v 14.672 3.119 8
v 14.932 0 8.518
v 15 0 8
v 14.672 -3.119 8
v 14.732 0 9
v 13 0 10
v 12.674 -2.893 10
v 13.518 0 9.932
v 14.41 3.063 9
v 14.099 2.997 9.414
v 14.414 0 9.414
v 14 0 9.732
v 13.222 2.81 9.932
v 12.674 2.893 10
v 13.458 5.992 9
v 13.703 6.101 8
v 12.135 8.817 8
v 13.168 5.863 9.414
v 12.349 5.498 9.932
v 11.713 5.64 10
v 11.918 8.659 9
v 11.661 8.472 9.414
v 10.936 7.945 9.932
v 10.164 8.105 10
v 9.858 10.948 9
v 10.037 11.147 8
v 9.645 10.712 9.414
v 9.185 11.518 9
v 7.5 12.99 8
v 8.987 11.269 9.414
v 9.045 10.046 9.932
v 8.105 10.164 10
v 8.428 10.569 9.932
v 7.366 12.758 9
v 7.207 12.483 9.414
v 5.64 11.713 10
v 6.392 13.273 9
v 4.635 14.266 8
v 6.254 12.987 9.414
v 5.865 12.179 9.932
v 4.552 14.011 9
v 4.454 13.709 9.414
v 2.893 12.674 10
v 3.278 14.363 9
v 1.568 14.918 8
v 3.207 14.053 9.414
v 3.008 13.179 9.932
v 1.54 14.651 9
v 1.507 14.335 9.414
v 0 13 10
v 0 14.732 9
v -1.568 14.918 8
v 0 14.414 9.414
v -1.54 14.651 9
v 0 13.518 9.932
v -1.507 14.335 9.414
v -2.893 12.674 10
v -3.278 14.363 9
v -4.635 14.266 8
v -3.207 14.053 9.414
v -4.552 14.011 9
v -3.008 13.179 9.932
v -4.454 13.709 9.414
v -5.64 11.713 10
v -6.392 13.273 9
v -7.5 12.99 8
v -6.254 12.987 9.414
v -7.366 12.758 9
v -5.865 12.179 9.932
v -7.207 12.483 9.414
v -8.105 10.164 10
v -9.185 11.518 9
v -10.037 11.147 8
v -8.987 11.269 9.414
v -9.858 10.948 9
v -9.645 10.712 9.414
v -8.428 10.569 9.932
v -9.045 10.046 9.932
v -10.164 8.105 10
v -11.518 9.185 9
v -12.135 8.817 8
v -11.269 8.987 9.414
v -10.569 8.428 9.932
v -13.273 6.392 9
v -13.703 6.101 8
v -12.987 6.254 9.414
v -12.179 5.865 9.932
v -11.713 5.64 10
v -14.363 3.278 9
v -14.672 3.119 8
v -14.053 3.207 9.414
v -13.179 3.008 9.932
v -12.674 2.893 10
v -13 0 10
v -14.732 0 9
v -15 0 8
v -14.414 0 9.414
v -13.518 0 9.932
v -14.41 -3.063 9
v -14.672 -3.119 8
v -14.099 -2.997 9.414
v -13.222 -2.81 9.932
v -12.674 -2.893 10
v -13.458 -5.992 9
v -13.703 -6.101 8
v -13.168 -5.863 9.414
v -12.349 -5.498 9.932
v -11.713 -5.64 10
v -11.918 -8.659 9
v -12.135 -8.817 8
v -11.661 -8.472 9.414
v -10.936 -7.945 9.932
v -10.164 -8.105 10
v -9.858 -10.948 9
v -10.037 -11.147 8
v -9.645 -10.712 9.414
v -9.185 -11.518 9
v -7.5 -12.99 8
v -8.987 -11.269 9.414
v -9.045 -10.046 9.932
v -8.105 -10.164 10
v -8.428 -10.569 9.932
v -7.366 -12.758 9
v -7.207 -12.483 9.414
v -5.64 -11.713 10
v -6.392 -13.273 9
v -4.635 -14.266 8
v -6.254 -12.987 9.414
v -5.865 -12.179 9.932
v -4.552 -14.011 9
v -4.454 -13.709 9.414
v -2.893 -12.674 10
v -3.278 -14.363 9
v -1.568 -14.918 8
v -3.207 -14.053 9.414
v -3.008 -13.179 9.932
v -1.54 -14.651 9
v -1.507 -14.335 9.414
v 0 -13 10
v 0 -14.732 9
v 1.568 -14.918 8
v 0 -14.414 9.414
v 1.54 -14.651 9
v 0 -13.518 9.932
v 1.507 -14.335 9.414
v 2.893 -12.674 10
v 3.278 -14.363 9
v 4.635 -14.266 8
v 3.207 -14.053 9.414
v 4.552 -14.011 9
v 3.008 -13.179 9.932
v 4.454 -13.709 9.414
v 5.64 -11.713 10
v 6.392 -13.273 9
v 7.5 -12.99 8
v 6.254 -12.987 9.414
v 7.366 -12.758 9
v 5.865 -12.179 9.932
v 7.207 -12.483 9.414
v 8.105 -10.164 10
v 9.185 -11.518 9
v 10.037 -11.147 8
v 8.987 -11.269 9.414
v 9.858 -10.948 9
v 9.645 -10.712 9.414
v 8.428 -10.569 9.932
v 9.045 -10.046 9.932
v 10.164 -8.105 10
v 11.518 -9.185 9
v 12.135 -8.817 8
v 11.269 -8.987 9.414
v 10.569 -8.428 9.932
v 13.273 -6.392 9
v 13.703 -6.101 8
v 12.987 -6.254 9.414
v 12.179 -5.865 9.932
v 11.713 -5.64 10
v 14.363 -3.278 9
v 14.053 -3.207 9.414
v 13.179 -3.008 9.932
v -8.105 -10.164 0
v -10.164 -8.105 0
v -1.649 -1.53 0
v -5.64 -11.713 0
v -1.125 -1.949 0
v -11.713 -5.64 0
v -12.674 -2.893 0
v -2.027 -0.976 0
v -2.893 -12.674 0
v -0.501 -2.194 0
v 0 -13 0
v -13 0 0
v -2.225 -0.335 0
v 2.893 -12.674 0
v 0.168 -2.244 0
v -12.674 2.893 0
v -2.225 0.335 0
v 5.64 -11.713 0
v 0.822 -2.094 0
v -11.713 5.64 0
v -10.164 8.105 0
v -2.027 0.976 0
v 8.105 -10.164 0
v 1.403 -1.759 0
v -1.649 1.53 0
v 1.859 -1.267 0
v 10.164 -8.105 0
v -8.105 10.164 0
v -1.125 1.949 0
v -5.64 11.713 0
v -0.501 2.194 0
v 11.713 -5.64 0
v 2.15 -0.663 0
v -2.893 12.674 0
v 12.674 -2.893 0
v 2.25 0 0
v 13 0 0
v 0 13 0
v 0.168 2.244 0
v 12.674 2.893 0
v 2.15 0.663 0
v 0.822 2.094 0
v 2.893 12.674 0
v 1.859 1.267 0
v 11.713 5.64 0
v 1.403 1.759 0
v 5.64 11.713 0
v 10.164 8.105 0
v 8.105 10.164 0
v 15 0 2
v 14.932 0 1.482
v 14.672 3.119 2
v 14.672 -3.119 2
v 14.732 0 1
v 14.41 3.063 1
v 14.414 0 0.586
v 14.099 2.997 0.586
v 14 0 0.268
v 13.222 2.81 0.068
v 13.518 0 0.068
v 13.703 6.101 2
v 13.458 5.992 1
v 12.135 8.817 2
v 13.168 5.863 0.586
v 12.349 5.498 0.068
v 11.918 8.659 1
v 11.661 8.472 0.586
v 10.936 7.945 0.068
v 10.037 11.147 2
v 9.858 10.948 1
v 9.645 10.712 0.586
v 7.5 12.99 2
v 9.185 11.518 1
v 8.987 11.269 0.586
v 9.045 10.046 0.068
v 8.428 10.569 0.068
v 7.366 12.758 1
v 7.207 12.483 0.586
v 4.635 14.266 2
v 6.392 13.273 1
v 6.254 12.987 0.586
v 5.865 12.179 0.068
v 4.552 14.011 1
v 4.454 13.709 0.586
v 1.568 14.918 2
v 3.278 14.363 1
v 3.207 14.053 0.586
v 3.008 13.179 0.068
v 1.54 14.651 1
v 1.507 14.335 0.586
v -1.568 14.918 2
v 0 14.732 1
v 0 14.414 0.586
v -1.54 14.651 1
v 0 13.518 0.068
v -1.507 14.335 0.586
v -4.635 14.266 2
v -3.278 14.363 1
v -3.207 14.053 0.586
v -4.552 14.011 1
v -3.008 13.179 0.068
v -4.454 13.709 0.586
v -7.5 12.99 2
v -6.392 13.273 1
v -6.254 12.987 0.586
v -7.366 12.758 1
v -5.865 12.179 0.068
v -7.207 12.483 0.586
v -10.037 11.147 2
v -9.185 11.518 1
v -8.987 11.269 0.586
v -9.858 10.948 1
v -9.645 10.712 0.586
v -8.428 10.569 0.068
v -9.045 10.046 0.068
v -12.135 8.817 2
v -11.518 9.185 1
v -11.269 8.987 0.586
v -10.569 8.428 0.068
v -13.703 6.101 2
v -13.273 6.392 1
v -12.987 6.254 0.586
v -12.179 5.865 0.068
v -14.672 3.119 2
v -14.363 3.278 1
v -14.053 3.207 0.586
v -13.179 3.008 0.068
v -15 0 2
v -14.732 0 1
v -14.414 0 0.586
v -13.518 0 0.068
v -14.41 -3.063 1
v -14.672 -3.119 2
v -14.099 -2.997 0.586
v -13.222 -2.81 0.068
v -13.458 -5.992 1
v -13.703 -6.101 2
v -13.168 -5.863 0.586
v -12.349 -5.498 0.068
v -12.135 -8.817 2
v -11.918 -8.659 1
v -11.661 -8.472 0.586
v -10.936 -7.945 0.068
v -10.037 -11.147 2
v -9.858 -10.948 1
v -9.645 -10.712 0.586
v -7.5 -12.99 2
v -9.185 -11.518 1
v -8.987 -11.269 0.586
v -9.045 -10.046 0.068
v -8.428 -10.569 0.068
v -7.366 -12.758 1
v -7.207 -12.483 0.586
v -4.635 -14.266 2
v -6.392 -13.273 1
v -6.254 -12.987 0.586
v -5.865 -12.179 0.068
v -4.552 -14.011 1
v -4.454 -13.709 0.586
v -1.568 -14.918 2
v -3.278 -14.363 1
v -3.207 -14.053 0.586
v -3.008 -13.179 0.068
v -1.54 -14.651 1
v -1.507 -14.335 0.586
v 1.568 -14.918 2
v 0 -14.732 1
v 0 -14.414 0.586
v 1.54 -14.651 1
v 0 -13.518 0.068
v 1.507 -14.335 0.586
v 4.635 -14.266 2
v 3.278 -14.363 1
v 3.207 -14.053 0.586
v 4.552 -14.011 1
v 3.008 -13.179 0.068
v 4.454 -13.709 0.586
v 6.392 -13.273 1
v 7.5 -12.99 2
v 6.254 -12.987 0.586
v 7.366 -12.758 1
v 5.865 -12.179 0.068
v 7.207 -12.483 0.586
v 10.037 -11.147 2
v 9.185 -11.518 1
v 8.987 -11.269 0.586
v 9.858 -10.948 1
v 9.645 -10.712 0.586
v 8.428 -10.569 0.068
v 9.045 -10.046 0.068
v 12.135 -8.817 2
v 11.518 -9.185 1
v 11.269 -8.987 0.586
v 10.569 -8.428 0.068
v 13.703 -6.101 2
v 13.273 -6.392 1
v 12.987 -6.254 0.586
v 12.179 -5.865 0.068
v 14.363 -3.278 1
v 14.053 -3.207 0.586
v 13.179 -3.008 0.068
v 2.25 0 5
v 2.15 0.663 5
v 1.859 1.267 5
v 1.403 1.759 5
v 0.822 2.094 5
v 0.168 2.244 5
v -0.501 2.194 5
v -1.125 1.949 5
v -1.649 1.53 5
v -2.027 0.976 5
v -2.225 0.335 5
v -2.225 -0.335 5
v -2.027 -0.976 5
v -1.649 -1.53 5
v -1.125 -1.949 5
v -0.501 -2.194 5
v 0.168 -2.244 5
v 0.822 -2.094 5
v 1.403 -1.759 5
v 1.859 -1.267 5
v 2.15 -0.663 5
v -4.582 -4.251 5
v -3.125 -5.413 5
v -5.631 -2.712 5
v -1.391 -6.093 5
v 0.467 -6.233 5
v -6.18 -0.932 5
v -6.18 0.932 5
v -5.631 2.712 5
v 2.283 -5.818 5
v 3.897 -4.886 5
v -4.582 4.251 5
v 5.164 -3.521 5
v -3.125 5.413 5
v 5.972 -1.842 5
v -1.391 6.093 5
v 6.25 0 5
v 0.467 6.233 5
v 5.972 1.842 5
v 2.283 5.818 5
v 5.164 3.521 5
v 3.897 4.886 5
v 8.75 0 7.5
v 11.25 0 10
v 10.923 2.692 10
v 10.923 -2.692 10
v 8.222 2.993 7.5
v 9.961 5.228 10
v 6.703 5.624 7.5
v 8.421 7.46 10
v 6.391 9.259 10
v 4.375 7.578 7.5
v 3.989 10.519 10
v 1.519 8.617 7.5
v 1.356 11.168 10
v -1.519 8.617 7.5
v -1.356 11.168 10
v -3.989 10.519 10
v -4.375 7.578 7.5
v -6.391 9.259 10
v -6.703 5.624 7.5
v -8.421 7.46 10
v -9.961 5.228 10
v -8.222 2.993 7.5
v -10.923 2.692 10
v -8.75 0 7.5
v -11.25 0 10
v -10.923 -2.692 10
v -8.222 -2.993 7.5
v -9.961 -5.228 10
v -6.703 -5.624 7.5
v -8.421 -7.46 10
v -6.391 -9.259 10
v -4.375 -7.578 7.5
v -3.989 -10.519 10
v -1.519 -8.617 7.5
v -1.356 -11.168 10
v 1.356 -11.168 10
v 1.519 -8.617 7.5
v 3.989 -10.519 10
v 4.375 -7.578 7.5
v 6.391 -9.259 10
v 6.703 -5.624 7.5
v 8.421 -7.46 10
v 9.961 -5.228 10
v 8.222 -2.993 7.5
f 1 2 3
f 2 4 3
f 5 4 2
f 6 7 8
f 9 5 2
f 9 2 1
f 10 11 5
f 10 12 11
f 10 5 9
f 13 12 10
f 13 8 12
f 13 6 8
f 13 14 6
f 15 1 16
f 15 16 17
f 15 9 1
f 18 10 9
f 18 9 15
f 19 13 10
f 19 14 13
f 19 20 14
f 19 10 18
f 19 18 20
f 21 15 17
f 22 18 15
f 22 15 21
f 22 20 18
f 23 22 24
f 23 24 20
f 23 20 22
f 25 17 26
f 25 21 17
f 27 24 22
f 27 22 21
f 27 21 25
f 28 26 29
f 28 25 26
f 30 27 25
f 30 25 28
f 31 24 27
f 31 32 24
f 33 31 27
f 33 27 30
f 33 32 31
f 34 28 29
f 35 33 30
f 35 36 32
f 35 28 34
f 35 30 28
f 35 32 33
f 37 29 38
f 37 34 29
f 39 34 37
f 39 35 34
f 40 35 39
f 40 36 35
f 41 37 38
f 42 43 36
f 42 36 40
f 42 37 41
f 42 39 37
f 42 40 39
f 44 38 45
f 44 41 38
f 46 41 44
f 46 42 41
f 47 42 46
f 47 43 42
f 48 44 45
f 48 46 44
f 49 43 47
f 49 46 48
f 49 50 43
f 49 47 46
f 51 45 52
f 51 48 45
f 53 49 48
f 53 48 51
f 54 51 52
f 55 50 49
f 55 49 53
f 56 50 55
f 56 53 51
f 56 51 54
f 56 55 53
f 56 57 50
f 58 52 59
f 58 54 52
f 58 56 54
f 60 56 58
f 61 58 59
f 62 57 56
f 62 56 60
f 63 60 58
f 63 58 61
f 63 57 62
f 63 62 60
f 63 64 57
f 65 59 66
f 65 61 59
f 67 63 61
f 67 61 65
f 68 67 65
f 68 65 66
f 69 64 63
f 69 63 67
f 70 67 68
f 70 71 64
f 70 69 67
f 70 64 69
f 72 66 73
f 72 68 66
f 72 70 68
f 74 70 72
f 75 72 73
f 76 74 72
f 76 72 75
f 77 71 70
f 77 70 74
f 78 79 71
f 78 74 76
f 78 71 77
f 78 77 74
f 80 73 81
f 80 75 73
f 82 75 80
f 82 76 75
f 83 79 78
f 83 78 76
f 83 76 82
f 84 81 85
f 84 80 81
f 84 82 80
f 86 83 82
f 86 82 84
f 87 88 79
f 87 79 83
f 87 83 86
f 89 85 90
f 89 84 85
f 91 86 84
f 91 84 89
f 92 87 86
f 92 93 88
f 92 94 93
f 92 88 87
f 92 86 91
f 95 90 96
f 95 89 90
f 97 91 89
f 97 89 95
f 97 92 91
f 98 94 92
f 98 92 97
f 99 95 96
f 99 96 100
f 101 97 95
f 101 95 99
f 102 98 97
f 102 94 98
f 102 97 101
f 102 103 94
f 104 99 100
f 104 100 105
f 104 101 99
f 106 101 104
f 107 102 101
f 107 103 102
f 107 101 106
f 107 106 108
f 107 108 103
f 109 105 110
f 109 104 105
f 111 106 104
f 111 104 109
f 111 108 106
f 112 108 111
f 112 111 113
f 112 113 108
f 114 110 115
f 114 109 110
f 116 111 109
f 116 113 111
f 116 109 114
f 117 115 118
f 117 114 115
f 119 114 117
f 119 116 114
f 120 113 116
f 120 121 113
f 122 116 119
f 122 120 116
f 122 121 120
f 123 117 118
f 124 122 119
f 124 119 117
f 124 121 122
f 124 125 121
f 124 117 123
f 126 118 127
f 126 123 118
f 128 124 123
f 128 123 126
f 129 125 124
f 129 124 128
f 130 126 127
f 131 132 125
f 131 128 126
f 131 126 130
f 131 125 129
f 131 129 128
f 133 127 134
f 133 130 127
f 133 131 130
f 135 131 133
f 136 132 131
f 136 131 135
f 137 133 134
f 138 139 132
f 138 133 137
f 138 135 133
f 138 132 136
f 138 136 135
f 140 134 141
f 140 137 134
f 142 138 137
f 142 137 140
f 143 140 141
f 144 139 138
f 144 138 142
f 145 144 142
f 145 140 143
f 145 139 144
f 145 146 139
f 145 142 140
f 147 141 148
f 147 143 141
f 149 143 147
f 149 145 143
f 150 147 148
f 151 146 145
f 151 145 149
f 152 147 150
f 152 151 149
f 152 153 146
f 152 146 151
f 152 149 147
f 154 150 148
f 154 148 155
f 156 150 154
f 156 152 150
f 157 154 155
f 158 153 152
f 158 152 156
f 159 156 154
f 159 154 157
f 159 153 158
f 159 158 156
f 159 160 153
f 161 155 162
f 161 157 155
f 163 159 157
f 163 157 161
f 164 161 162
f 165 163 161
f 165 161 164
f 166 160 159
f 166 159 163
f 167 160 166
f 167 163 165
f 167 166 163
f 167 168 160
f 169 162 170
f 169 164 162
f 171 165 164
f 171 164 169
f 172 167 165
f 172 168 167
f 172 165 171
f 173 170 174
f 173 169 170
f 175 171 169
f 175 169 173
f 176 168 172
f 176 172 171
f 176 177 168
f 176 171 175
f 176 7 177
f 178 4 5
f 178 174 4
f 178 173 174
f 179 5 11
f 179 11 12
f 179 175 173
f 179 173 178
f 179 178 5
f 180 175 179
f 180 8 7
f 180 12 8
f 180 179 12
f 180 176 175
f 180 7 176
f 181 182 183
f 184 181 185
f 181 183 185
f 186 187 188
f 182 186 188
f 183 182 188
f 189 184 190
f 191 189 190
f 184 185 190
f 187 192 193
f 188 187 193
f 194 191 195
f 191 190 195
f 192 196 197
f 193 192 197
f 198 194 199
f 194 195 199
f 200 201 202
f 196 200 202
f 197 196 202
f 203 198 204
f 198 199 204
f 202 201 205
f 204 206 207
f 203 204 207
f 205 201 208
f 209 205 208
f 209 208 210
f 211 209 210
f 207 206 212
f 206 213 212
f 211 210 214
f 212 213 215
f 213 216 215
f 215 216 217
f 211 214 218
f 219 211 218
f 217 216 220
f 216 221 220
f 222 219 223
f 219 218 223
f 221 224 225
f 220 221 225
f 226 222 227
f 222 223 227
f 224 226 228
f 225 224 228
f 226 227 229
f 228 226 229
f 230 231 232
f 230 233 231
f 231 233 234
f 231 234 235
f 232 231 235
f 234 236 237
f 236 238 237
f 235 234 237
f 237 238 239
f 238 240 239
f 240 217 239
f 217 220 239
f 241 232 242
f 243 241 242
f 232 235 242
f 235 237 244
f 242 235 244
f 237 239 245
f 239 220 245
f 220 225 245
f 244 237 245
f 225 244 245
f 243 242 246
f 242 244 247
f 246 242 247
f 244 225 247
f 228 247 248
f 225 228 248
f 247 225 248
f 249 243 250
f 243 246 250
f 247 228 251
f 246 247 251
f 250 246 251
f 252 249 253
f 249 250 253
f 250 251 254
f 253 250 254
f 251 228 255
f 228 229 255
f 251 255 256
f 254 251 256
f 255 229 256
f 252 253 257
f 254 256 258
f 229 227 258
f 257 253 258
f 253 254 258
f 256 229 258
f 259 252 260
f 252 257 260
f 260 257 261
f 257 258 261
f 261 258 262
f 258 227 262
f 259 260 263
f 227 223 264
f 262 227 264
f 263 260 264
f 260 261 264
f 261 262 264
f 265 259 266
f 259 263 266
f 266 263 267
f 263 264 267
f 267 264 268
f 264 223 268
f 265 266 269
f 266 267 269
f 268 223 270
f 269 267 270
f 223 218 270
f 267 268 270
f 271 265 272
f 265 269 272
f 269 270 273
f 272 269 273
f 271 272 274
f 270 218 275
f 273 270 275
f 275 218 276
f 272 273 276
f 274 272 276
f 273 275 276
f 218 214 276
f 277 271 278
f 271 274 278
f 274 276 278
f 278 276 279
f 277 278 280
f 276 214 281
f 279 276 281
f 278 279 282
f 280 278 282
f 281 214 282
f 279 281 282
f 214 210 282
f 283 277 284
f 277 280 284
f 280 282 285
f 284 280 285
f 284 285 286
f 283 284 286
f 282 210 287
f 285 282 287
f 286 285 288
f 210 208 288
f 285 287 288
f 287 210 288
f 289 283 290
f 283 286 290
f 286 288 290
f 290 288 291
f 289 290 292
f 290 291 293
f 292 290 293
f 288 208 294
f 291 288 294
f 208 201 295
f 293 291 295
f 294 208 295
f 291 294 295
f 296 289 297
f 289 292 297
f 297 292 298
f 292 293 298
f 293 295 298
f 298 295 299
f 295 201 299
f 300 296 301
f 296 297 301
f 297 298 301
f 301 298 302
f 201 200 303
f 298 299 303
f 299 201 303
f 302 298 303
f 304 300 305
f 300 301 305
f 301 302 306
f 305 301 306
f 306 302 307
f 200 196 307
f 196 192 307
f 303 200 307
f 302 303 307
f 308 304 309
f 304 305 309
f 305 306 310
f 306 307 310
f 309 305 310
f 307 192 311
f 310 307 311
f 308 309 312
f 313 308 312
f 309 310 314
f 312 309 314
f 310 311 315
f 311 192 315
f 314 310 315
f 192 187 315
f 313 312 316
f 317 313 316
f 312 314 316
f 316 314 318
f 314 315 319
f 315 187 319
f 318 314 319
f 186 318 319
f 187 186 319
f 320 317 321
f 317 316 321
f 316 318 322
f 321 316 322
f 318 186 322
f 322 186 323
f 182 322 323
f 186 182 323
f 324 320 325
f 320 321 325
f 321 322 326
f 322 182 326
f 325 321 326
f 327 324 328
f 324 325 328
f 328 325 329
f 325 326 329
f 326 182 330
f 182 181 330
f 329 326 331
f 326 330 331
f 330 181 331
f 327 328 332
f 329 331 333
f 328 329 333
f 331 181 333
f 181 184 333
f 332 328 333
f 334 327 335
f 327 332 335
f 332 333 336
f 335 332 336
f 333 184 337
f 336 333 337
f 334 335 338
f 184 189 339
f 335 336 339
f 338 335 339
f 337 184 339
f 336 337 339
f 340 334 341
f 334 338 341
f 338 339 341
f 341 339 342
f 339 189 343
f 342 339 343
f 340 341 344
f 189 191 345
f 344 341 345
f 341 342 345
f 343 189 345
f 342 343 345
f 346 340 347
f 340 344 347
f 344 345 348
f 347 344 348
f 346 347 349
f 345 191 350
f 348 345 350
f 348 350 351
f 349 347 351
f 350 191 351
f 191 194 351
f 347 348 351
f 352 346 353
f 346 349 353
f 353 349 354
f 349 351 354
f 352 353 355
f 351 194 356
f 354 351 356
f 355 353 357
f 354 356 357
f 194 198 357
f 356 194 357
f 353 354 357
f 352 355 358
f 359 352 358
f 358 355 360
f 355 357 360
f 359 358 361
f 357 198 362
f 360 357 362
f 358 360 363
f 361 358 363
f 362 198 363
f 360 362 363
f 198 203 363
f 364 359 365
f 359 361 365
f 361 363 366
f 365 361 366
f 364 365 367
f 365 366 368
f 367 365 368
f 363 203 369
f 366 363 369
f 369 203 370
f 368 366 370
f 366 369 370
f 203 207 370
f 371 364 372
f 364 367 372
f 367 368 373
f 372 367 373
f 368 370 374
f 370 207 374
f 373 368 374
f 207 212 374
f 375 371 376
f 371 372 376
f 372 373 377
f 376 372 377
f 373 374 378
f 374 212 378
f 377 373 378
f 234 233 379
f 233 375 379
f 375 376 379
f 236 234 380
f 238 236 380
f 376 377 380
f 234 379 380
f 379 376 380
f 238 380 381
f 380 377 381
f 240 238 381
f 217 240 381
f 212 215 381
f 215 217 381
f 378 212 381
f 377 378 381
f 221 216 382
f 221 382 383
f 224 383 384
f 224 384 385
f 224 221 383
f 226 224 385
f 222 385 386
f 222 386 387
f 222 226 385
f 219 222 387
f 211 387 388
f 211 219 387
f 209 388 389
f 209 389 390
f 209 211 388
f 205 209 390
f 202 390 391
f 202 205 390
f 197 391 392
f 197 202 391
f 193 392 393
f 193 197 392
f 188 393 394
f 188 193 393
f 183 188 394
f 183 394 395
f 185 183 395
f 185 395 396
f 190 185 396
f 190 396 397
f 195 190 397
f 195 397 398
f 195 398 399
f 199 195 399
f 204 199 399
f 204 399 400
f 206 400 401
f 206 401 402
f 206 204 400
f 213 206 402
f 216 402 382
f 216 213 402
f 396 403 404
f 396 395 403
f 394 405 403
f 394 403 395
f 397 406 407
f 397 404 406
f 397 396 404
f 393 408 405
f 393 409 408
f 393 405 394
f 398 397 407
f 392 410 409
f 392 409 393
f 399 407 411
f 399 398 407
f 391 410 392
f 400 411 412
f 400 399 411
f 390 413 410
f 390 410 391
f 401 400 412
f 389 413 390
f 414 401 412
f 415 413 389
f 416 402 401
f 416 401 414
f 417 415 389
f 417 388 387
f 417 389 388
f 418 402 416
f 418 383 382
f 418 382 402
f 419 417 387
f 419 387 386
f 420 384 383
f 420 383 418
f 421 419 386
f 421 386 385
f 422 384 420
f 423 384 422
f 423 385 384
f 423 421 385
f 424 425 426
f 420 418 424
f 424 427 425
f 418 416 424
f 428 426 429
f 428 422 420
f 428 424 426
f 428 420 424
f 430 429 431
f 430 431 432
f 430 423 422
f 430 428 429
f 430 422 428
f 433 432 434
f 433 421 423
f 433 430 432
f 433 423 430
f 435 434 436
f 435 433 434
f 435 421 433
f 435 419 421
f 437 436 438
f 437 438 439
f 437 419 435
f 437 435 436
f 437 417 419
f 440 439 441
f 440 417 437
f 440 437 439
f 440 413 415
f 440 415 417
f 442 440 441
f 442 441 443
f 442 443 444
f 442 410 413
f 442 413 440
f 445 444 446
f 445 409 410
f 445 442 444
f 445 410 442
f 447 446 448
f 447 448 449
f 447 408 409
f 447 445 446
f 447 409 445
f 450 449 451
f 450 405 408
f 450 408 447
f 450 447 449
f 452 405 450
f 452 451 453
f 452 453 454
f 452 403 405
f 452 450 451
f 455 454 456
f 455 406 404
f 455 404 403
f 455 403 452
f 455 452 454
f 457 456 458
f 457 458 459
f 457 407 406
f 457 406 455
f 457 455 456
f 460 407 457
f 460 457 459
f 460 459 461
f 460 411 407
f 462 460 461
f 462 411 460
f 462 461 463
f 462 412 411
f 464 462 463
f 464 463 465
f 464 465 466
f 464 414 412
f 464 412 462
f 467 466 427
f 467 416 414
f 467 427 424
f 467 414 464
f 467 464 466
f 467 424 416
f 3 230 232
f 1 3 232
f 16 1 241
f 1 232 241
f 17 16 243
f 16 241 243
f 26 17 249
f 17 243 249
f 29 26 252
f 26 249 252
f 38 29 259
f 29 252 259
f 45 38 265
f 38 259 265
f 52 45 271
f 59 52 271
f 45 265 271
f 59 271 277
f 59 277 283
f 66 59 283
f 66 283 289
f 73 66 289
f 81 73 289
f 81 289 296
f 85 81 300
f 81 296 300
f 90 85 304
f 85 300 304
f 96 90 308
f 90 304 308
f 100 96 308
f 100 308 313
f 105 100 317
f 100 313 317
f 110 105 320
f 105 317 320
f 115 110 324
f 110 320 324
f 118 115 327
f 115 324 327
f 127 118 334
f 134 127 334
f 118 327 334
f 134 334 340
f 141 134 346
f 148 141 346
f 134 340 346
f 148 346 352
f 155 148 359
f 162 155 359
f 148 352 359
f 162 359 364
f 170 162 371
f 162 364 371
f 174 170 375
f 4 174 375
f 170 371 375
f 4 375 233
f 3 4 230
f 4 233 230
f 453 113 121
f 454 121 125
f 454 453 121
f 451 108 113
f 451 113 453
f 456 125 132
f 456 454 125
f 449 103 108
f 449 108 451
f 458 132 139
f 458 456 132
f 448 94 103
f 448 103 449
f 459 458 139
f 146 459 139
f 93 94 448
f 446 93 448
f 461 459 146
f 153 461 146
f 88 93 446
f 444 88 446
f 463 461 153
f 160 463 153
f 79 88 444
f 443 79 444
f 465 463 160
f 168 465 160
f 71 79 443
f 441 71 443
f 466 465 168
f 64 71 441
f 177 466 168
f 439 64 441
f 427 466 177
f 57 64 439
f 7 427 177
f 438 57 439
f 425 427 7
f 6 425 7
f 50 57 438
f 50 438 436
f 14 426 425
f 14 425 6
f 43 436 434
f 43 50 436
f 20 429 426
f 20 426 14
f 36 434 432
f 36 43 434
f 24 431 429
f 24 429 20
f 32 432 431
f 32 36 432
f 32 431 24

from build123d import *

# Parameters (mm, degrees)
F0_R     = 15
F0_R_2   = 11
F0_R_3   = 4.25
F1_DEPTH = 10
F2_R     = 2
F0_R_4   = 2.25
F3_DEPTH = 5


# Not quite as in the source:
# - a fillet or chamfer that OpenCascade refuses, or shapes differently, is made with other operations: its cross-section is extruded or revolved along the edge and cut away or added


with BuildPart() as f1:
    # F0 (on Top) → F1 (new body)
    with BuildSketch(Plane.XY):
        Circle(F0_R)
        Circle(F0_R_2, mode=Mode.SUBTRACT)
        Circle(F0_R_2)
        Circle(F0_R_3, mode=Mode.SUBTRACT)
    extrude(amount=F1_DEPTH)

    # F2
    f2_edges = [f1.edges().sort_by_distance(p)[0] for p in [
        (-15, 0, 10),
        (15, 0, 5),
        (-15, 0, 0),
    ]]
    fillet(f2_edges, radius=F2_R)

    # F0 (on Top) → F3 (join)
    with BuildSketch(Plane.XY):
        Circle(F0_R_3)
        Circle(F0_R_4, mode=Mode.SUBTRACT)
    extrude(amount=F3_DEPTH)

    # F4: chamfer of 7 on 1 edges, made by hand


with BuildPart() as f4_tool2:
    # F4_s3 → F4_t4 (revolve)
    with BuildSketch(Plane.XZ):
        Polygon((11.25, 10), (4.25, 3), (4.25, 10), align=None)
    revolve(axis=Axis((0, 0, 10), (0, 0, 1)))

    split(bisect_by=Plane.XY.offset(5), keep=Keep.TOP)


with BuildPart() as f1_1:
    add(f1.part)

    # F4_t1: cut F4_tool2
    add(f4_tool2.part, mode=Mode.SUBTRACT)


solid = f1_1.part
